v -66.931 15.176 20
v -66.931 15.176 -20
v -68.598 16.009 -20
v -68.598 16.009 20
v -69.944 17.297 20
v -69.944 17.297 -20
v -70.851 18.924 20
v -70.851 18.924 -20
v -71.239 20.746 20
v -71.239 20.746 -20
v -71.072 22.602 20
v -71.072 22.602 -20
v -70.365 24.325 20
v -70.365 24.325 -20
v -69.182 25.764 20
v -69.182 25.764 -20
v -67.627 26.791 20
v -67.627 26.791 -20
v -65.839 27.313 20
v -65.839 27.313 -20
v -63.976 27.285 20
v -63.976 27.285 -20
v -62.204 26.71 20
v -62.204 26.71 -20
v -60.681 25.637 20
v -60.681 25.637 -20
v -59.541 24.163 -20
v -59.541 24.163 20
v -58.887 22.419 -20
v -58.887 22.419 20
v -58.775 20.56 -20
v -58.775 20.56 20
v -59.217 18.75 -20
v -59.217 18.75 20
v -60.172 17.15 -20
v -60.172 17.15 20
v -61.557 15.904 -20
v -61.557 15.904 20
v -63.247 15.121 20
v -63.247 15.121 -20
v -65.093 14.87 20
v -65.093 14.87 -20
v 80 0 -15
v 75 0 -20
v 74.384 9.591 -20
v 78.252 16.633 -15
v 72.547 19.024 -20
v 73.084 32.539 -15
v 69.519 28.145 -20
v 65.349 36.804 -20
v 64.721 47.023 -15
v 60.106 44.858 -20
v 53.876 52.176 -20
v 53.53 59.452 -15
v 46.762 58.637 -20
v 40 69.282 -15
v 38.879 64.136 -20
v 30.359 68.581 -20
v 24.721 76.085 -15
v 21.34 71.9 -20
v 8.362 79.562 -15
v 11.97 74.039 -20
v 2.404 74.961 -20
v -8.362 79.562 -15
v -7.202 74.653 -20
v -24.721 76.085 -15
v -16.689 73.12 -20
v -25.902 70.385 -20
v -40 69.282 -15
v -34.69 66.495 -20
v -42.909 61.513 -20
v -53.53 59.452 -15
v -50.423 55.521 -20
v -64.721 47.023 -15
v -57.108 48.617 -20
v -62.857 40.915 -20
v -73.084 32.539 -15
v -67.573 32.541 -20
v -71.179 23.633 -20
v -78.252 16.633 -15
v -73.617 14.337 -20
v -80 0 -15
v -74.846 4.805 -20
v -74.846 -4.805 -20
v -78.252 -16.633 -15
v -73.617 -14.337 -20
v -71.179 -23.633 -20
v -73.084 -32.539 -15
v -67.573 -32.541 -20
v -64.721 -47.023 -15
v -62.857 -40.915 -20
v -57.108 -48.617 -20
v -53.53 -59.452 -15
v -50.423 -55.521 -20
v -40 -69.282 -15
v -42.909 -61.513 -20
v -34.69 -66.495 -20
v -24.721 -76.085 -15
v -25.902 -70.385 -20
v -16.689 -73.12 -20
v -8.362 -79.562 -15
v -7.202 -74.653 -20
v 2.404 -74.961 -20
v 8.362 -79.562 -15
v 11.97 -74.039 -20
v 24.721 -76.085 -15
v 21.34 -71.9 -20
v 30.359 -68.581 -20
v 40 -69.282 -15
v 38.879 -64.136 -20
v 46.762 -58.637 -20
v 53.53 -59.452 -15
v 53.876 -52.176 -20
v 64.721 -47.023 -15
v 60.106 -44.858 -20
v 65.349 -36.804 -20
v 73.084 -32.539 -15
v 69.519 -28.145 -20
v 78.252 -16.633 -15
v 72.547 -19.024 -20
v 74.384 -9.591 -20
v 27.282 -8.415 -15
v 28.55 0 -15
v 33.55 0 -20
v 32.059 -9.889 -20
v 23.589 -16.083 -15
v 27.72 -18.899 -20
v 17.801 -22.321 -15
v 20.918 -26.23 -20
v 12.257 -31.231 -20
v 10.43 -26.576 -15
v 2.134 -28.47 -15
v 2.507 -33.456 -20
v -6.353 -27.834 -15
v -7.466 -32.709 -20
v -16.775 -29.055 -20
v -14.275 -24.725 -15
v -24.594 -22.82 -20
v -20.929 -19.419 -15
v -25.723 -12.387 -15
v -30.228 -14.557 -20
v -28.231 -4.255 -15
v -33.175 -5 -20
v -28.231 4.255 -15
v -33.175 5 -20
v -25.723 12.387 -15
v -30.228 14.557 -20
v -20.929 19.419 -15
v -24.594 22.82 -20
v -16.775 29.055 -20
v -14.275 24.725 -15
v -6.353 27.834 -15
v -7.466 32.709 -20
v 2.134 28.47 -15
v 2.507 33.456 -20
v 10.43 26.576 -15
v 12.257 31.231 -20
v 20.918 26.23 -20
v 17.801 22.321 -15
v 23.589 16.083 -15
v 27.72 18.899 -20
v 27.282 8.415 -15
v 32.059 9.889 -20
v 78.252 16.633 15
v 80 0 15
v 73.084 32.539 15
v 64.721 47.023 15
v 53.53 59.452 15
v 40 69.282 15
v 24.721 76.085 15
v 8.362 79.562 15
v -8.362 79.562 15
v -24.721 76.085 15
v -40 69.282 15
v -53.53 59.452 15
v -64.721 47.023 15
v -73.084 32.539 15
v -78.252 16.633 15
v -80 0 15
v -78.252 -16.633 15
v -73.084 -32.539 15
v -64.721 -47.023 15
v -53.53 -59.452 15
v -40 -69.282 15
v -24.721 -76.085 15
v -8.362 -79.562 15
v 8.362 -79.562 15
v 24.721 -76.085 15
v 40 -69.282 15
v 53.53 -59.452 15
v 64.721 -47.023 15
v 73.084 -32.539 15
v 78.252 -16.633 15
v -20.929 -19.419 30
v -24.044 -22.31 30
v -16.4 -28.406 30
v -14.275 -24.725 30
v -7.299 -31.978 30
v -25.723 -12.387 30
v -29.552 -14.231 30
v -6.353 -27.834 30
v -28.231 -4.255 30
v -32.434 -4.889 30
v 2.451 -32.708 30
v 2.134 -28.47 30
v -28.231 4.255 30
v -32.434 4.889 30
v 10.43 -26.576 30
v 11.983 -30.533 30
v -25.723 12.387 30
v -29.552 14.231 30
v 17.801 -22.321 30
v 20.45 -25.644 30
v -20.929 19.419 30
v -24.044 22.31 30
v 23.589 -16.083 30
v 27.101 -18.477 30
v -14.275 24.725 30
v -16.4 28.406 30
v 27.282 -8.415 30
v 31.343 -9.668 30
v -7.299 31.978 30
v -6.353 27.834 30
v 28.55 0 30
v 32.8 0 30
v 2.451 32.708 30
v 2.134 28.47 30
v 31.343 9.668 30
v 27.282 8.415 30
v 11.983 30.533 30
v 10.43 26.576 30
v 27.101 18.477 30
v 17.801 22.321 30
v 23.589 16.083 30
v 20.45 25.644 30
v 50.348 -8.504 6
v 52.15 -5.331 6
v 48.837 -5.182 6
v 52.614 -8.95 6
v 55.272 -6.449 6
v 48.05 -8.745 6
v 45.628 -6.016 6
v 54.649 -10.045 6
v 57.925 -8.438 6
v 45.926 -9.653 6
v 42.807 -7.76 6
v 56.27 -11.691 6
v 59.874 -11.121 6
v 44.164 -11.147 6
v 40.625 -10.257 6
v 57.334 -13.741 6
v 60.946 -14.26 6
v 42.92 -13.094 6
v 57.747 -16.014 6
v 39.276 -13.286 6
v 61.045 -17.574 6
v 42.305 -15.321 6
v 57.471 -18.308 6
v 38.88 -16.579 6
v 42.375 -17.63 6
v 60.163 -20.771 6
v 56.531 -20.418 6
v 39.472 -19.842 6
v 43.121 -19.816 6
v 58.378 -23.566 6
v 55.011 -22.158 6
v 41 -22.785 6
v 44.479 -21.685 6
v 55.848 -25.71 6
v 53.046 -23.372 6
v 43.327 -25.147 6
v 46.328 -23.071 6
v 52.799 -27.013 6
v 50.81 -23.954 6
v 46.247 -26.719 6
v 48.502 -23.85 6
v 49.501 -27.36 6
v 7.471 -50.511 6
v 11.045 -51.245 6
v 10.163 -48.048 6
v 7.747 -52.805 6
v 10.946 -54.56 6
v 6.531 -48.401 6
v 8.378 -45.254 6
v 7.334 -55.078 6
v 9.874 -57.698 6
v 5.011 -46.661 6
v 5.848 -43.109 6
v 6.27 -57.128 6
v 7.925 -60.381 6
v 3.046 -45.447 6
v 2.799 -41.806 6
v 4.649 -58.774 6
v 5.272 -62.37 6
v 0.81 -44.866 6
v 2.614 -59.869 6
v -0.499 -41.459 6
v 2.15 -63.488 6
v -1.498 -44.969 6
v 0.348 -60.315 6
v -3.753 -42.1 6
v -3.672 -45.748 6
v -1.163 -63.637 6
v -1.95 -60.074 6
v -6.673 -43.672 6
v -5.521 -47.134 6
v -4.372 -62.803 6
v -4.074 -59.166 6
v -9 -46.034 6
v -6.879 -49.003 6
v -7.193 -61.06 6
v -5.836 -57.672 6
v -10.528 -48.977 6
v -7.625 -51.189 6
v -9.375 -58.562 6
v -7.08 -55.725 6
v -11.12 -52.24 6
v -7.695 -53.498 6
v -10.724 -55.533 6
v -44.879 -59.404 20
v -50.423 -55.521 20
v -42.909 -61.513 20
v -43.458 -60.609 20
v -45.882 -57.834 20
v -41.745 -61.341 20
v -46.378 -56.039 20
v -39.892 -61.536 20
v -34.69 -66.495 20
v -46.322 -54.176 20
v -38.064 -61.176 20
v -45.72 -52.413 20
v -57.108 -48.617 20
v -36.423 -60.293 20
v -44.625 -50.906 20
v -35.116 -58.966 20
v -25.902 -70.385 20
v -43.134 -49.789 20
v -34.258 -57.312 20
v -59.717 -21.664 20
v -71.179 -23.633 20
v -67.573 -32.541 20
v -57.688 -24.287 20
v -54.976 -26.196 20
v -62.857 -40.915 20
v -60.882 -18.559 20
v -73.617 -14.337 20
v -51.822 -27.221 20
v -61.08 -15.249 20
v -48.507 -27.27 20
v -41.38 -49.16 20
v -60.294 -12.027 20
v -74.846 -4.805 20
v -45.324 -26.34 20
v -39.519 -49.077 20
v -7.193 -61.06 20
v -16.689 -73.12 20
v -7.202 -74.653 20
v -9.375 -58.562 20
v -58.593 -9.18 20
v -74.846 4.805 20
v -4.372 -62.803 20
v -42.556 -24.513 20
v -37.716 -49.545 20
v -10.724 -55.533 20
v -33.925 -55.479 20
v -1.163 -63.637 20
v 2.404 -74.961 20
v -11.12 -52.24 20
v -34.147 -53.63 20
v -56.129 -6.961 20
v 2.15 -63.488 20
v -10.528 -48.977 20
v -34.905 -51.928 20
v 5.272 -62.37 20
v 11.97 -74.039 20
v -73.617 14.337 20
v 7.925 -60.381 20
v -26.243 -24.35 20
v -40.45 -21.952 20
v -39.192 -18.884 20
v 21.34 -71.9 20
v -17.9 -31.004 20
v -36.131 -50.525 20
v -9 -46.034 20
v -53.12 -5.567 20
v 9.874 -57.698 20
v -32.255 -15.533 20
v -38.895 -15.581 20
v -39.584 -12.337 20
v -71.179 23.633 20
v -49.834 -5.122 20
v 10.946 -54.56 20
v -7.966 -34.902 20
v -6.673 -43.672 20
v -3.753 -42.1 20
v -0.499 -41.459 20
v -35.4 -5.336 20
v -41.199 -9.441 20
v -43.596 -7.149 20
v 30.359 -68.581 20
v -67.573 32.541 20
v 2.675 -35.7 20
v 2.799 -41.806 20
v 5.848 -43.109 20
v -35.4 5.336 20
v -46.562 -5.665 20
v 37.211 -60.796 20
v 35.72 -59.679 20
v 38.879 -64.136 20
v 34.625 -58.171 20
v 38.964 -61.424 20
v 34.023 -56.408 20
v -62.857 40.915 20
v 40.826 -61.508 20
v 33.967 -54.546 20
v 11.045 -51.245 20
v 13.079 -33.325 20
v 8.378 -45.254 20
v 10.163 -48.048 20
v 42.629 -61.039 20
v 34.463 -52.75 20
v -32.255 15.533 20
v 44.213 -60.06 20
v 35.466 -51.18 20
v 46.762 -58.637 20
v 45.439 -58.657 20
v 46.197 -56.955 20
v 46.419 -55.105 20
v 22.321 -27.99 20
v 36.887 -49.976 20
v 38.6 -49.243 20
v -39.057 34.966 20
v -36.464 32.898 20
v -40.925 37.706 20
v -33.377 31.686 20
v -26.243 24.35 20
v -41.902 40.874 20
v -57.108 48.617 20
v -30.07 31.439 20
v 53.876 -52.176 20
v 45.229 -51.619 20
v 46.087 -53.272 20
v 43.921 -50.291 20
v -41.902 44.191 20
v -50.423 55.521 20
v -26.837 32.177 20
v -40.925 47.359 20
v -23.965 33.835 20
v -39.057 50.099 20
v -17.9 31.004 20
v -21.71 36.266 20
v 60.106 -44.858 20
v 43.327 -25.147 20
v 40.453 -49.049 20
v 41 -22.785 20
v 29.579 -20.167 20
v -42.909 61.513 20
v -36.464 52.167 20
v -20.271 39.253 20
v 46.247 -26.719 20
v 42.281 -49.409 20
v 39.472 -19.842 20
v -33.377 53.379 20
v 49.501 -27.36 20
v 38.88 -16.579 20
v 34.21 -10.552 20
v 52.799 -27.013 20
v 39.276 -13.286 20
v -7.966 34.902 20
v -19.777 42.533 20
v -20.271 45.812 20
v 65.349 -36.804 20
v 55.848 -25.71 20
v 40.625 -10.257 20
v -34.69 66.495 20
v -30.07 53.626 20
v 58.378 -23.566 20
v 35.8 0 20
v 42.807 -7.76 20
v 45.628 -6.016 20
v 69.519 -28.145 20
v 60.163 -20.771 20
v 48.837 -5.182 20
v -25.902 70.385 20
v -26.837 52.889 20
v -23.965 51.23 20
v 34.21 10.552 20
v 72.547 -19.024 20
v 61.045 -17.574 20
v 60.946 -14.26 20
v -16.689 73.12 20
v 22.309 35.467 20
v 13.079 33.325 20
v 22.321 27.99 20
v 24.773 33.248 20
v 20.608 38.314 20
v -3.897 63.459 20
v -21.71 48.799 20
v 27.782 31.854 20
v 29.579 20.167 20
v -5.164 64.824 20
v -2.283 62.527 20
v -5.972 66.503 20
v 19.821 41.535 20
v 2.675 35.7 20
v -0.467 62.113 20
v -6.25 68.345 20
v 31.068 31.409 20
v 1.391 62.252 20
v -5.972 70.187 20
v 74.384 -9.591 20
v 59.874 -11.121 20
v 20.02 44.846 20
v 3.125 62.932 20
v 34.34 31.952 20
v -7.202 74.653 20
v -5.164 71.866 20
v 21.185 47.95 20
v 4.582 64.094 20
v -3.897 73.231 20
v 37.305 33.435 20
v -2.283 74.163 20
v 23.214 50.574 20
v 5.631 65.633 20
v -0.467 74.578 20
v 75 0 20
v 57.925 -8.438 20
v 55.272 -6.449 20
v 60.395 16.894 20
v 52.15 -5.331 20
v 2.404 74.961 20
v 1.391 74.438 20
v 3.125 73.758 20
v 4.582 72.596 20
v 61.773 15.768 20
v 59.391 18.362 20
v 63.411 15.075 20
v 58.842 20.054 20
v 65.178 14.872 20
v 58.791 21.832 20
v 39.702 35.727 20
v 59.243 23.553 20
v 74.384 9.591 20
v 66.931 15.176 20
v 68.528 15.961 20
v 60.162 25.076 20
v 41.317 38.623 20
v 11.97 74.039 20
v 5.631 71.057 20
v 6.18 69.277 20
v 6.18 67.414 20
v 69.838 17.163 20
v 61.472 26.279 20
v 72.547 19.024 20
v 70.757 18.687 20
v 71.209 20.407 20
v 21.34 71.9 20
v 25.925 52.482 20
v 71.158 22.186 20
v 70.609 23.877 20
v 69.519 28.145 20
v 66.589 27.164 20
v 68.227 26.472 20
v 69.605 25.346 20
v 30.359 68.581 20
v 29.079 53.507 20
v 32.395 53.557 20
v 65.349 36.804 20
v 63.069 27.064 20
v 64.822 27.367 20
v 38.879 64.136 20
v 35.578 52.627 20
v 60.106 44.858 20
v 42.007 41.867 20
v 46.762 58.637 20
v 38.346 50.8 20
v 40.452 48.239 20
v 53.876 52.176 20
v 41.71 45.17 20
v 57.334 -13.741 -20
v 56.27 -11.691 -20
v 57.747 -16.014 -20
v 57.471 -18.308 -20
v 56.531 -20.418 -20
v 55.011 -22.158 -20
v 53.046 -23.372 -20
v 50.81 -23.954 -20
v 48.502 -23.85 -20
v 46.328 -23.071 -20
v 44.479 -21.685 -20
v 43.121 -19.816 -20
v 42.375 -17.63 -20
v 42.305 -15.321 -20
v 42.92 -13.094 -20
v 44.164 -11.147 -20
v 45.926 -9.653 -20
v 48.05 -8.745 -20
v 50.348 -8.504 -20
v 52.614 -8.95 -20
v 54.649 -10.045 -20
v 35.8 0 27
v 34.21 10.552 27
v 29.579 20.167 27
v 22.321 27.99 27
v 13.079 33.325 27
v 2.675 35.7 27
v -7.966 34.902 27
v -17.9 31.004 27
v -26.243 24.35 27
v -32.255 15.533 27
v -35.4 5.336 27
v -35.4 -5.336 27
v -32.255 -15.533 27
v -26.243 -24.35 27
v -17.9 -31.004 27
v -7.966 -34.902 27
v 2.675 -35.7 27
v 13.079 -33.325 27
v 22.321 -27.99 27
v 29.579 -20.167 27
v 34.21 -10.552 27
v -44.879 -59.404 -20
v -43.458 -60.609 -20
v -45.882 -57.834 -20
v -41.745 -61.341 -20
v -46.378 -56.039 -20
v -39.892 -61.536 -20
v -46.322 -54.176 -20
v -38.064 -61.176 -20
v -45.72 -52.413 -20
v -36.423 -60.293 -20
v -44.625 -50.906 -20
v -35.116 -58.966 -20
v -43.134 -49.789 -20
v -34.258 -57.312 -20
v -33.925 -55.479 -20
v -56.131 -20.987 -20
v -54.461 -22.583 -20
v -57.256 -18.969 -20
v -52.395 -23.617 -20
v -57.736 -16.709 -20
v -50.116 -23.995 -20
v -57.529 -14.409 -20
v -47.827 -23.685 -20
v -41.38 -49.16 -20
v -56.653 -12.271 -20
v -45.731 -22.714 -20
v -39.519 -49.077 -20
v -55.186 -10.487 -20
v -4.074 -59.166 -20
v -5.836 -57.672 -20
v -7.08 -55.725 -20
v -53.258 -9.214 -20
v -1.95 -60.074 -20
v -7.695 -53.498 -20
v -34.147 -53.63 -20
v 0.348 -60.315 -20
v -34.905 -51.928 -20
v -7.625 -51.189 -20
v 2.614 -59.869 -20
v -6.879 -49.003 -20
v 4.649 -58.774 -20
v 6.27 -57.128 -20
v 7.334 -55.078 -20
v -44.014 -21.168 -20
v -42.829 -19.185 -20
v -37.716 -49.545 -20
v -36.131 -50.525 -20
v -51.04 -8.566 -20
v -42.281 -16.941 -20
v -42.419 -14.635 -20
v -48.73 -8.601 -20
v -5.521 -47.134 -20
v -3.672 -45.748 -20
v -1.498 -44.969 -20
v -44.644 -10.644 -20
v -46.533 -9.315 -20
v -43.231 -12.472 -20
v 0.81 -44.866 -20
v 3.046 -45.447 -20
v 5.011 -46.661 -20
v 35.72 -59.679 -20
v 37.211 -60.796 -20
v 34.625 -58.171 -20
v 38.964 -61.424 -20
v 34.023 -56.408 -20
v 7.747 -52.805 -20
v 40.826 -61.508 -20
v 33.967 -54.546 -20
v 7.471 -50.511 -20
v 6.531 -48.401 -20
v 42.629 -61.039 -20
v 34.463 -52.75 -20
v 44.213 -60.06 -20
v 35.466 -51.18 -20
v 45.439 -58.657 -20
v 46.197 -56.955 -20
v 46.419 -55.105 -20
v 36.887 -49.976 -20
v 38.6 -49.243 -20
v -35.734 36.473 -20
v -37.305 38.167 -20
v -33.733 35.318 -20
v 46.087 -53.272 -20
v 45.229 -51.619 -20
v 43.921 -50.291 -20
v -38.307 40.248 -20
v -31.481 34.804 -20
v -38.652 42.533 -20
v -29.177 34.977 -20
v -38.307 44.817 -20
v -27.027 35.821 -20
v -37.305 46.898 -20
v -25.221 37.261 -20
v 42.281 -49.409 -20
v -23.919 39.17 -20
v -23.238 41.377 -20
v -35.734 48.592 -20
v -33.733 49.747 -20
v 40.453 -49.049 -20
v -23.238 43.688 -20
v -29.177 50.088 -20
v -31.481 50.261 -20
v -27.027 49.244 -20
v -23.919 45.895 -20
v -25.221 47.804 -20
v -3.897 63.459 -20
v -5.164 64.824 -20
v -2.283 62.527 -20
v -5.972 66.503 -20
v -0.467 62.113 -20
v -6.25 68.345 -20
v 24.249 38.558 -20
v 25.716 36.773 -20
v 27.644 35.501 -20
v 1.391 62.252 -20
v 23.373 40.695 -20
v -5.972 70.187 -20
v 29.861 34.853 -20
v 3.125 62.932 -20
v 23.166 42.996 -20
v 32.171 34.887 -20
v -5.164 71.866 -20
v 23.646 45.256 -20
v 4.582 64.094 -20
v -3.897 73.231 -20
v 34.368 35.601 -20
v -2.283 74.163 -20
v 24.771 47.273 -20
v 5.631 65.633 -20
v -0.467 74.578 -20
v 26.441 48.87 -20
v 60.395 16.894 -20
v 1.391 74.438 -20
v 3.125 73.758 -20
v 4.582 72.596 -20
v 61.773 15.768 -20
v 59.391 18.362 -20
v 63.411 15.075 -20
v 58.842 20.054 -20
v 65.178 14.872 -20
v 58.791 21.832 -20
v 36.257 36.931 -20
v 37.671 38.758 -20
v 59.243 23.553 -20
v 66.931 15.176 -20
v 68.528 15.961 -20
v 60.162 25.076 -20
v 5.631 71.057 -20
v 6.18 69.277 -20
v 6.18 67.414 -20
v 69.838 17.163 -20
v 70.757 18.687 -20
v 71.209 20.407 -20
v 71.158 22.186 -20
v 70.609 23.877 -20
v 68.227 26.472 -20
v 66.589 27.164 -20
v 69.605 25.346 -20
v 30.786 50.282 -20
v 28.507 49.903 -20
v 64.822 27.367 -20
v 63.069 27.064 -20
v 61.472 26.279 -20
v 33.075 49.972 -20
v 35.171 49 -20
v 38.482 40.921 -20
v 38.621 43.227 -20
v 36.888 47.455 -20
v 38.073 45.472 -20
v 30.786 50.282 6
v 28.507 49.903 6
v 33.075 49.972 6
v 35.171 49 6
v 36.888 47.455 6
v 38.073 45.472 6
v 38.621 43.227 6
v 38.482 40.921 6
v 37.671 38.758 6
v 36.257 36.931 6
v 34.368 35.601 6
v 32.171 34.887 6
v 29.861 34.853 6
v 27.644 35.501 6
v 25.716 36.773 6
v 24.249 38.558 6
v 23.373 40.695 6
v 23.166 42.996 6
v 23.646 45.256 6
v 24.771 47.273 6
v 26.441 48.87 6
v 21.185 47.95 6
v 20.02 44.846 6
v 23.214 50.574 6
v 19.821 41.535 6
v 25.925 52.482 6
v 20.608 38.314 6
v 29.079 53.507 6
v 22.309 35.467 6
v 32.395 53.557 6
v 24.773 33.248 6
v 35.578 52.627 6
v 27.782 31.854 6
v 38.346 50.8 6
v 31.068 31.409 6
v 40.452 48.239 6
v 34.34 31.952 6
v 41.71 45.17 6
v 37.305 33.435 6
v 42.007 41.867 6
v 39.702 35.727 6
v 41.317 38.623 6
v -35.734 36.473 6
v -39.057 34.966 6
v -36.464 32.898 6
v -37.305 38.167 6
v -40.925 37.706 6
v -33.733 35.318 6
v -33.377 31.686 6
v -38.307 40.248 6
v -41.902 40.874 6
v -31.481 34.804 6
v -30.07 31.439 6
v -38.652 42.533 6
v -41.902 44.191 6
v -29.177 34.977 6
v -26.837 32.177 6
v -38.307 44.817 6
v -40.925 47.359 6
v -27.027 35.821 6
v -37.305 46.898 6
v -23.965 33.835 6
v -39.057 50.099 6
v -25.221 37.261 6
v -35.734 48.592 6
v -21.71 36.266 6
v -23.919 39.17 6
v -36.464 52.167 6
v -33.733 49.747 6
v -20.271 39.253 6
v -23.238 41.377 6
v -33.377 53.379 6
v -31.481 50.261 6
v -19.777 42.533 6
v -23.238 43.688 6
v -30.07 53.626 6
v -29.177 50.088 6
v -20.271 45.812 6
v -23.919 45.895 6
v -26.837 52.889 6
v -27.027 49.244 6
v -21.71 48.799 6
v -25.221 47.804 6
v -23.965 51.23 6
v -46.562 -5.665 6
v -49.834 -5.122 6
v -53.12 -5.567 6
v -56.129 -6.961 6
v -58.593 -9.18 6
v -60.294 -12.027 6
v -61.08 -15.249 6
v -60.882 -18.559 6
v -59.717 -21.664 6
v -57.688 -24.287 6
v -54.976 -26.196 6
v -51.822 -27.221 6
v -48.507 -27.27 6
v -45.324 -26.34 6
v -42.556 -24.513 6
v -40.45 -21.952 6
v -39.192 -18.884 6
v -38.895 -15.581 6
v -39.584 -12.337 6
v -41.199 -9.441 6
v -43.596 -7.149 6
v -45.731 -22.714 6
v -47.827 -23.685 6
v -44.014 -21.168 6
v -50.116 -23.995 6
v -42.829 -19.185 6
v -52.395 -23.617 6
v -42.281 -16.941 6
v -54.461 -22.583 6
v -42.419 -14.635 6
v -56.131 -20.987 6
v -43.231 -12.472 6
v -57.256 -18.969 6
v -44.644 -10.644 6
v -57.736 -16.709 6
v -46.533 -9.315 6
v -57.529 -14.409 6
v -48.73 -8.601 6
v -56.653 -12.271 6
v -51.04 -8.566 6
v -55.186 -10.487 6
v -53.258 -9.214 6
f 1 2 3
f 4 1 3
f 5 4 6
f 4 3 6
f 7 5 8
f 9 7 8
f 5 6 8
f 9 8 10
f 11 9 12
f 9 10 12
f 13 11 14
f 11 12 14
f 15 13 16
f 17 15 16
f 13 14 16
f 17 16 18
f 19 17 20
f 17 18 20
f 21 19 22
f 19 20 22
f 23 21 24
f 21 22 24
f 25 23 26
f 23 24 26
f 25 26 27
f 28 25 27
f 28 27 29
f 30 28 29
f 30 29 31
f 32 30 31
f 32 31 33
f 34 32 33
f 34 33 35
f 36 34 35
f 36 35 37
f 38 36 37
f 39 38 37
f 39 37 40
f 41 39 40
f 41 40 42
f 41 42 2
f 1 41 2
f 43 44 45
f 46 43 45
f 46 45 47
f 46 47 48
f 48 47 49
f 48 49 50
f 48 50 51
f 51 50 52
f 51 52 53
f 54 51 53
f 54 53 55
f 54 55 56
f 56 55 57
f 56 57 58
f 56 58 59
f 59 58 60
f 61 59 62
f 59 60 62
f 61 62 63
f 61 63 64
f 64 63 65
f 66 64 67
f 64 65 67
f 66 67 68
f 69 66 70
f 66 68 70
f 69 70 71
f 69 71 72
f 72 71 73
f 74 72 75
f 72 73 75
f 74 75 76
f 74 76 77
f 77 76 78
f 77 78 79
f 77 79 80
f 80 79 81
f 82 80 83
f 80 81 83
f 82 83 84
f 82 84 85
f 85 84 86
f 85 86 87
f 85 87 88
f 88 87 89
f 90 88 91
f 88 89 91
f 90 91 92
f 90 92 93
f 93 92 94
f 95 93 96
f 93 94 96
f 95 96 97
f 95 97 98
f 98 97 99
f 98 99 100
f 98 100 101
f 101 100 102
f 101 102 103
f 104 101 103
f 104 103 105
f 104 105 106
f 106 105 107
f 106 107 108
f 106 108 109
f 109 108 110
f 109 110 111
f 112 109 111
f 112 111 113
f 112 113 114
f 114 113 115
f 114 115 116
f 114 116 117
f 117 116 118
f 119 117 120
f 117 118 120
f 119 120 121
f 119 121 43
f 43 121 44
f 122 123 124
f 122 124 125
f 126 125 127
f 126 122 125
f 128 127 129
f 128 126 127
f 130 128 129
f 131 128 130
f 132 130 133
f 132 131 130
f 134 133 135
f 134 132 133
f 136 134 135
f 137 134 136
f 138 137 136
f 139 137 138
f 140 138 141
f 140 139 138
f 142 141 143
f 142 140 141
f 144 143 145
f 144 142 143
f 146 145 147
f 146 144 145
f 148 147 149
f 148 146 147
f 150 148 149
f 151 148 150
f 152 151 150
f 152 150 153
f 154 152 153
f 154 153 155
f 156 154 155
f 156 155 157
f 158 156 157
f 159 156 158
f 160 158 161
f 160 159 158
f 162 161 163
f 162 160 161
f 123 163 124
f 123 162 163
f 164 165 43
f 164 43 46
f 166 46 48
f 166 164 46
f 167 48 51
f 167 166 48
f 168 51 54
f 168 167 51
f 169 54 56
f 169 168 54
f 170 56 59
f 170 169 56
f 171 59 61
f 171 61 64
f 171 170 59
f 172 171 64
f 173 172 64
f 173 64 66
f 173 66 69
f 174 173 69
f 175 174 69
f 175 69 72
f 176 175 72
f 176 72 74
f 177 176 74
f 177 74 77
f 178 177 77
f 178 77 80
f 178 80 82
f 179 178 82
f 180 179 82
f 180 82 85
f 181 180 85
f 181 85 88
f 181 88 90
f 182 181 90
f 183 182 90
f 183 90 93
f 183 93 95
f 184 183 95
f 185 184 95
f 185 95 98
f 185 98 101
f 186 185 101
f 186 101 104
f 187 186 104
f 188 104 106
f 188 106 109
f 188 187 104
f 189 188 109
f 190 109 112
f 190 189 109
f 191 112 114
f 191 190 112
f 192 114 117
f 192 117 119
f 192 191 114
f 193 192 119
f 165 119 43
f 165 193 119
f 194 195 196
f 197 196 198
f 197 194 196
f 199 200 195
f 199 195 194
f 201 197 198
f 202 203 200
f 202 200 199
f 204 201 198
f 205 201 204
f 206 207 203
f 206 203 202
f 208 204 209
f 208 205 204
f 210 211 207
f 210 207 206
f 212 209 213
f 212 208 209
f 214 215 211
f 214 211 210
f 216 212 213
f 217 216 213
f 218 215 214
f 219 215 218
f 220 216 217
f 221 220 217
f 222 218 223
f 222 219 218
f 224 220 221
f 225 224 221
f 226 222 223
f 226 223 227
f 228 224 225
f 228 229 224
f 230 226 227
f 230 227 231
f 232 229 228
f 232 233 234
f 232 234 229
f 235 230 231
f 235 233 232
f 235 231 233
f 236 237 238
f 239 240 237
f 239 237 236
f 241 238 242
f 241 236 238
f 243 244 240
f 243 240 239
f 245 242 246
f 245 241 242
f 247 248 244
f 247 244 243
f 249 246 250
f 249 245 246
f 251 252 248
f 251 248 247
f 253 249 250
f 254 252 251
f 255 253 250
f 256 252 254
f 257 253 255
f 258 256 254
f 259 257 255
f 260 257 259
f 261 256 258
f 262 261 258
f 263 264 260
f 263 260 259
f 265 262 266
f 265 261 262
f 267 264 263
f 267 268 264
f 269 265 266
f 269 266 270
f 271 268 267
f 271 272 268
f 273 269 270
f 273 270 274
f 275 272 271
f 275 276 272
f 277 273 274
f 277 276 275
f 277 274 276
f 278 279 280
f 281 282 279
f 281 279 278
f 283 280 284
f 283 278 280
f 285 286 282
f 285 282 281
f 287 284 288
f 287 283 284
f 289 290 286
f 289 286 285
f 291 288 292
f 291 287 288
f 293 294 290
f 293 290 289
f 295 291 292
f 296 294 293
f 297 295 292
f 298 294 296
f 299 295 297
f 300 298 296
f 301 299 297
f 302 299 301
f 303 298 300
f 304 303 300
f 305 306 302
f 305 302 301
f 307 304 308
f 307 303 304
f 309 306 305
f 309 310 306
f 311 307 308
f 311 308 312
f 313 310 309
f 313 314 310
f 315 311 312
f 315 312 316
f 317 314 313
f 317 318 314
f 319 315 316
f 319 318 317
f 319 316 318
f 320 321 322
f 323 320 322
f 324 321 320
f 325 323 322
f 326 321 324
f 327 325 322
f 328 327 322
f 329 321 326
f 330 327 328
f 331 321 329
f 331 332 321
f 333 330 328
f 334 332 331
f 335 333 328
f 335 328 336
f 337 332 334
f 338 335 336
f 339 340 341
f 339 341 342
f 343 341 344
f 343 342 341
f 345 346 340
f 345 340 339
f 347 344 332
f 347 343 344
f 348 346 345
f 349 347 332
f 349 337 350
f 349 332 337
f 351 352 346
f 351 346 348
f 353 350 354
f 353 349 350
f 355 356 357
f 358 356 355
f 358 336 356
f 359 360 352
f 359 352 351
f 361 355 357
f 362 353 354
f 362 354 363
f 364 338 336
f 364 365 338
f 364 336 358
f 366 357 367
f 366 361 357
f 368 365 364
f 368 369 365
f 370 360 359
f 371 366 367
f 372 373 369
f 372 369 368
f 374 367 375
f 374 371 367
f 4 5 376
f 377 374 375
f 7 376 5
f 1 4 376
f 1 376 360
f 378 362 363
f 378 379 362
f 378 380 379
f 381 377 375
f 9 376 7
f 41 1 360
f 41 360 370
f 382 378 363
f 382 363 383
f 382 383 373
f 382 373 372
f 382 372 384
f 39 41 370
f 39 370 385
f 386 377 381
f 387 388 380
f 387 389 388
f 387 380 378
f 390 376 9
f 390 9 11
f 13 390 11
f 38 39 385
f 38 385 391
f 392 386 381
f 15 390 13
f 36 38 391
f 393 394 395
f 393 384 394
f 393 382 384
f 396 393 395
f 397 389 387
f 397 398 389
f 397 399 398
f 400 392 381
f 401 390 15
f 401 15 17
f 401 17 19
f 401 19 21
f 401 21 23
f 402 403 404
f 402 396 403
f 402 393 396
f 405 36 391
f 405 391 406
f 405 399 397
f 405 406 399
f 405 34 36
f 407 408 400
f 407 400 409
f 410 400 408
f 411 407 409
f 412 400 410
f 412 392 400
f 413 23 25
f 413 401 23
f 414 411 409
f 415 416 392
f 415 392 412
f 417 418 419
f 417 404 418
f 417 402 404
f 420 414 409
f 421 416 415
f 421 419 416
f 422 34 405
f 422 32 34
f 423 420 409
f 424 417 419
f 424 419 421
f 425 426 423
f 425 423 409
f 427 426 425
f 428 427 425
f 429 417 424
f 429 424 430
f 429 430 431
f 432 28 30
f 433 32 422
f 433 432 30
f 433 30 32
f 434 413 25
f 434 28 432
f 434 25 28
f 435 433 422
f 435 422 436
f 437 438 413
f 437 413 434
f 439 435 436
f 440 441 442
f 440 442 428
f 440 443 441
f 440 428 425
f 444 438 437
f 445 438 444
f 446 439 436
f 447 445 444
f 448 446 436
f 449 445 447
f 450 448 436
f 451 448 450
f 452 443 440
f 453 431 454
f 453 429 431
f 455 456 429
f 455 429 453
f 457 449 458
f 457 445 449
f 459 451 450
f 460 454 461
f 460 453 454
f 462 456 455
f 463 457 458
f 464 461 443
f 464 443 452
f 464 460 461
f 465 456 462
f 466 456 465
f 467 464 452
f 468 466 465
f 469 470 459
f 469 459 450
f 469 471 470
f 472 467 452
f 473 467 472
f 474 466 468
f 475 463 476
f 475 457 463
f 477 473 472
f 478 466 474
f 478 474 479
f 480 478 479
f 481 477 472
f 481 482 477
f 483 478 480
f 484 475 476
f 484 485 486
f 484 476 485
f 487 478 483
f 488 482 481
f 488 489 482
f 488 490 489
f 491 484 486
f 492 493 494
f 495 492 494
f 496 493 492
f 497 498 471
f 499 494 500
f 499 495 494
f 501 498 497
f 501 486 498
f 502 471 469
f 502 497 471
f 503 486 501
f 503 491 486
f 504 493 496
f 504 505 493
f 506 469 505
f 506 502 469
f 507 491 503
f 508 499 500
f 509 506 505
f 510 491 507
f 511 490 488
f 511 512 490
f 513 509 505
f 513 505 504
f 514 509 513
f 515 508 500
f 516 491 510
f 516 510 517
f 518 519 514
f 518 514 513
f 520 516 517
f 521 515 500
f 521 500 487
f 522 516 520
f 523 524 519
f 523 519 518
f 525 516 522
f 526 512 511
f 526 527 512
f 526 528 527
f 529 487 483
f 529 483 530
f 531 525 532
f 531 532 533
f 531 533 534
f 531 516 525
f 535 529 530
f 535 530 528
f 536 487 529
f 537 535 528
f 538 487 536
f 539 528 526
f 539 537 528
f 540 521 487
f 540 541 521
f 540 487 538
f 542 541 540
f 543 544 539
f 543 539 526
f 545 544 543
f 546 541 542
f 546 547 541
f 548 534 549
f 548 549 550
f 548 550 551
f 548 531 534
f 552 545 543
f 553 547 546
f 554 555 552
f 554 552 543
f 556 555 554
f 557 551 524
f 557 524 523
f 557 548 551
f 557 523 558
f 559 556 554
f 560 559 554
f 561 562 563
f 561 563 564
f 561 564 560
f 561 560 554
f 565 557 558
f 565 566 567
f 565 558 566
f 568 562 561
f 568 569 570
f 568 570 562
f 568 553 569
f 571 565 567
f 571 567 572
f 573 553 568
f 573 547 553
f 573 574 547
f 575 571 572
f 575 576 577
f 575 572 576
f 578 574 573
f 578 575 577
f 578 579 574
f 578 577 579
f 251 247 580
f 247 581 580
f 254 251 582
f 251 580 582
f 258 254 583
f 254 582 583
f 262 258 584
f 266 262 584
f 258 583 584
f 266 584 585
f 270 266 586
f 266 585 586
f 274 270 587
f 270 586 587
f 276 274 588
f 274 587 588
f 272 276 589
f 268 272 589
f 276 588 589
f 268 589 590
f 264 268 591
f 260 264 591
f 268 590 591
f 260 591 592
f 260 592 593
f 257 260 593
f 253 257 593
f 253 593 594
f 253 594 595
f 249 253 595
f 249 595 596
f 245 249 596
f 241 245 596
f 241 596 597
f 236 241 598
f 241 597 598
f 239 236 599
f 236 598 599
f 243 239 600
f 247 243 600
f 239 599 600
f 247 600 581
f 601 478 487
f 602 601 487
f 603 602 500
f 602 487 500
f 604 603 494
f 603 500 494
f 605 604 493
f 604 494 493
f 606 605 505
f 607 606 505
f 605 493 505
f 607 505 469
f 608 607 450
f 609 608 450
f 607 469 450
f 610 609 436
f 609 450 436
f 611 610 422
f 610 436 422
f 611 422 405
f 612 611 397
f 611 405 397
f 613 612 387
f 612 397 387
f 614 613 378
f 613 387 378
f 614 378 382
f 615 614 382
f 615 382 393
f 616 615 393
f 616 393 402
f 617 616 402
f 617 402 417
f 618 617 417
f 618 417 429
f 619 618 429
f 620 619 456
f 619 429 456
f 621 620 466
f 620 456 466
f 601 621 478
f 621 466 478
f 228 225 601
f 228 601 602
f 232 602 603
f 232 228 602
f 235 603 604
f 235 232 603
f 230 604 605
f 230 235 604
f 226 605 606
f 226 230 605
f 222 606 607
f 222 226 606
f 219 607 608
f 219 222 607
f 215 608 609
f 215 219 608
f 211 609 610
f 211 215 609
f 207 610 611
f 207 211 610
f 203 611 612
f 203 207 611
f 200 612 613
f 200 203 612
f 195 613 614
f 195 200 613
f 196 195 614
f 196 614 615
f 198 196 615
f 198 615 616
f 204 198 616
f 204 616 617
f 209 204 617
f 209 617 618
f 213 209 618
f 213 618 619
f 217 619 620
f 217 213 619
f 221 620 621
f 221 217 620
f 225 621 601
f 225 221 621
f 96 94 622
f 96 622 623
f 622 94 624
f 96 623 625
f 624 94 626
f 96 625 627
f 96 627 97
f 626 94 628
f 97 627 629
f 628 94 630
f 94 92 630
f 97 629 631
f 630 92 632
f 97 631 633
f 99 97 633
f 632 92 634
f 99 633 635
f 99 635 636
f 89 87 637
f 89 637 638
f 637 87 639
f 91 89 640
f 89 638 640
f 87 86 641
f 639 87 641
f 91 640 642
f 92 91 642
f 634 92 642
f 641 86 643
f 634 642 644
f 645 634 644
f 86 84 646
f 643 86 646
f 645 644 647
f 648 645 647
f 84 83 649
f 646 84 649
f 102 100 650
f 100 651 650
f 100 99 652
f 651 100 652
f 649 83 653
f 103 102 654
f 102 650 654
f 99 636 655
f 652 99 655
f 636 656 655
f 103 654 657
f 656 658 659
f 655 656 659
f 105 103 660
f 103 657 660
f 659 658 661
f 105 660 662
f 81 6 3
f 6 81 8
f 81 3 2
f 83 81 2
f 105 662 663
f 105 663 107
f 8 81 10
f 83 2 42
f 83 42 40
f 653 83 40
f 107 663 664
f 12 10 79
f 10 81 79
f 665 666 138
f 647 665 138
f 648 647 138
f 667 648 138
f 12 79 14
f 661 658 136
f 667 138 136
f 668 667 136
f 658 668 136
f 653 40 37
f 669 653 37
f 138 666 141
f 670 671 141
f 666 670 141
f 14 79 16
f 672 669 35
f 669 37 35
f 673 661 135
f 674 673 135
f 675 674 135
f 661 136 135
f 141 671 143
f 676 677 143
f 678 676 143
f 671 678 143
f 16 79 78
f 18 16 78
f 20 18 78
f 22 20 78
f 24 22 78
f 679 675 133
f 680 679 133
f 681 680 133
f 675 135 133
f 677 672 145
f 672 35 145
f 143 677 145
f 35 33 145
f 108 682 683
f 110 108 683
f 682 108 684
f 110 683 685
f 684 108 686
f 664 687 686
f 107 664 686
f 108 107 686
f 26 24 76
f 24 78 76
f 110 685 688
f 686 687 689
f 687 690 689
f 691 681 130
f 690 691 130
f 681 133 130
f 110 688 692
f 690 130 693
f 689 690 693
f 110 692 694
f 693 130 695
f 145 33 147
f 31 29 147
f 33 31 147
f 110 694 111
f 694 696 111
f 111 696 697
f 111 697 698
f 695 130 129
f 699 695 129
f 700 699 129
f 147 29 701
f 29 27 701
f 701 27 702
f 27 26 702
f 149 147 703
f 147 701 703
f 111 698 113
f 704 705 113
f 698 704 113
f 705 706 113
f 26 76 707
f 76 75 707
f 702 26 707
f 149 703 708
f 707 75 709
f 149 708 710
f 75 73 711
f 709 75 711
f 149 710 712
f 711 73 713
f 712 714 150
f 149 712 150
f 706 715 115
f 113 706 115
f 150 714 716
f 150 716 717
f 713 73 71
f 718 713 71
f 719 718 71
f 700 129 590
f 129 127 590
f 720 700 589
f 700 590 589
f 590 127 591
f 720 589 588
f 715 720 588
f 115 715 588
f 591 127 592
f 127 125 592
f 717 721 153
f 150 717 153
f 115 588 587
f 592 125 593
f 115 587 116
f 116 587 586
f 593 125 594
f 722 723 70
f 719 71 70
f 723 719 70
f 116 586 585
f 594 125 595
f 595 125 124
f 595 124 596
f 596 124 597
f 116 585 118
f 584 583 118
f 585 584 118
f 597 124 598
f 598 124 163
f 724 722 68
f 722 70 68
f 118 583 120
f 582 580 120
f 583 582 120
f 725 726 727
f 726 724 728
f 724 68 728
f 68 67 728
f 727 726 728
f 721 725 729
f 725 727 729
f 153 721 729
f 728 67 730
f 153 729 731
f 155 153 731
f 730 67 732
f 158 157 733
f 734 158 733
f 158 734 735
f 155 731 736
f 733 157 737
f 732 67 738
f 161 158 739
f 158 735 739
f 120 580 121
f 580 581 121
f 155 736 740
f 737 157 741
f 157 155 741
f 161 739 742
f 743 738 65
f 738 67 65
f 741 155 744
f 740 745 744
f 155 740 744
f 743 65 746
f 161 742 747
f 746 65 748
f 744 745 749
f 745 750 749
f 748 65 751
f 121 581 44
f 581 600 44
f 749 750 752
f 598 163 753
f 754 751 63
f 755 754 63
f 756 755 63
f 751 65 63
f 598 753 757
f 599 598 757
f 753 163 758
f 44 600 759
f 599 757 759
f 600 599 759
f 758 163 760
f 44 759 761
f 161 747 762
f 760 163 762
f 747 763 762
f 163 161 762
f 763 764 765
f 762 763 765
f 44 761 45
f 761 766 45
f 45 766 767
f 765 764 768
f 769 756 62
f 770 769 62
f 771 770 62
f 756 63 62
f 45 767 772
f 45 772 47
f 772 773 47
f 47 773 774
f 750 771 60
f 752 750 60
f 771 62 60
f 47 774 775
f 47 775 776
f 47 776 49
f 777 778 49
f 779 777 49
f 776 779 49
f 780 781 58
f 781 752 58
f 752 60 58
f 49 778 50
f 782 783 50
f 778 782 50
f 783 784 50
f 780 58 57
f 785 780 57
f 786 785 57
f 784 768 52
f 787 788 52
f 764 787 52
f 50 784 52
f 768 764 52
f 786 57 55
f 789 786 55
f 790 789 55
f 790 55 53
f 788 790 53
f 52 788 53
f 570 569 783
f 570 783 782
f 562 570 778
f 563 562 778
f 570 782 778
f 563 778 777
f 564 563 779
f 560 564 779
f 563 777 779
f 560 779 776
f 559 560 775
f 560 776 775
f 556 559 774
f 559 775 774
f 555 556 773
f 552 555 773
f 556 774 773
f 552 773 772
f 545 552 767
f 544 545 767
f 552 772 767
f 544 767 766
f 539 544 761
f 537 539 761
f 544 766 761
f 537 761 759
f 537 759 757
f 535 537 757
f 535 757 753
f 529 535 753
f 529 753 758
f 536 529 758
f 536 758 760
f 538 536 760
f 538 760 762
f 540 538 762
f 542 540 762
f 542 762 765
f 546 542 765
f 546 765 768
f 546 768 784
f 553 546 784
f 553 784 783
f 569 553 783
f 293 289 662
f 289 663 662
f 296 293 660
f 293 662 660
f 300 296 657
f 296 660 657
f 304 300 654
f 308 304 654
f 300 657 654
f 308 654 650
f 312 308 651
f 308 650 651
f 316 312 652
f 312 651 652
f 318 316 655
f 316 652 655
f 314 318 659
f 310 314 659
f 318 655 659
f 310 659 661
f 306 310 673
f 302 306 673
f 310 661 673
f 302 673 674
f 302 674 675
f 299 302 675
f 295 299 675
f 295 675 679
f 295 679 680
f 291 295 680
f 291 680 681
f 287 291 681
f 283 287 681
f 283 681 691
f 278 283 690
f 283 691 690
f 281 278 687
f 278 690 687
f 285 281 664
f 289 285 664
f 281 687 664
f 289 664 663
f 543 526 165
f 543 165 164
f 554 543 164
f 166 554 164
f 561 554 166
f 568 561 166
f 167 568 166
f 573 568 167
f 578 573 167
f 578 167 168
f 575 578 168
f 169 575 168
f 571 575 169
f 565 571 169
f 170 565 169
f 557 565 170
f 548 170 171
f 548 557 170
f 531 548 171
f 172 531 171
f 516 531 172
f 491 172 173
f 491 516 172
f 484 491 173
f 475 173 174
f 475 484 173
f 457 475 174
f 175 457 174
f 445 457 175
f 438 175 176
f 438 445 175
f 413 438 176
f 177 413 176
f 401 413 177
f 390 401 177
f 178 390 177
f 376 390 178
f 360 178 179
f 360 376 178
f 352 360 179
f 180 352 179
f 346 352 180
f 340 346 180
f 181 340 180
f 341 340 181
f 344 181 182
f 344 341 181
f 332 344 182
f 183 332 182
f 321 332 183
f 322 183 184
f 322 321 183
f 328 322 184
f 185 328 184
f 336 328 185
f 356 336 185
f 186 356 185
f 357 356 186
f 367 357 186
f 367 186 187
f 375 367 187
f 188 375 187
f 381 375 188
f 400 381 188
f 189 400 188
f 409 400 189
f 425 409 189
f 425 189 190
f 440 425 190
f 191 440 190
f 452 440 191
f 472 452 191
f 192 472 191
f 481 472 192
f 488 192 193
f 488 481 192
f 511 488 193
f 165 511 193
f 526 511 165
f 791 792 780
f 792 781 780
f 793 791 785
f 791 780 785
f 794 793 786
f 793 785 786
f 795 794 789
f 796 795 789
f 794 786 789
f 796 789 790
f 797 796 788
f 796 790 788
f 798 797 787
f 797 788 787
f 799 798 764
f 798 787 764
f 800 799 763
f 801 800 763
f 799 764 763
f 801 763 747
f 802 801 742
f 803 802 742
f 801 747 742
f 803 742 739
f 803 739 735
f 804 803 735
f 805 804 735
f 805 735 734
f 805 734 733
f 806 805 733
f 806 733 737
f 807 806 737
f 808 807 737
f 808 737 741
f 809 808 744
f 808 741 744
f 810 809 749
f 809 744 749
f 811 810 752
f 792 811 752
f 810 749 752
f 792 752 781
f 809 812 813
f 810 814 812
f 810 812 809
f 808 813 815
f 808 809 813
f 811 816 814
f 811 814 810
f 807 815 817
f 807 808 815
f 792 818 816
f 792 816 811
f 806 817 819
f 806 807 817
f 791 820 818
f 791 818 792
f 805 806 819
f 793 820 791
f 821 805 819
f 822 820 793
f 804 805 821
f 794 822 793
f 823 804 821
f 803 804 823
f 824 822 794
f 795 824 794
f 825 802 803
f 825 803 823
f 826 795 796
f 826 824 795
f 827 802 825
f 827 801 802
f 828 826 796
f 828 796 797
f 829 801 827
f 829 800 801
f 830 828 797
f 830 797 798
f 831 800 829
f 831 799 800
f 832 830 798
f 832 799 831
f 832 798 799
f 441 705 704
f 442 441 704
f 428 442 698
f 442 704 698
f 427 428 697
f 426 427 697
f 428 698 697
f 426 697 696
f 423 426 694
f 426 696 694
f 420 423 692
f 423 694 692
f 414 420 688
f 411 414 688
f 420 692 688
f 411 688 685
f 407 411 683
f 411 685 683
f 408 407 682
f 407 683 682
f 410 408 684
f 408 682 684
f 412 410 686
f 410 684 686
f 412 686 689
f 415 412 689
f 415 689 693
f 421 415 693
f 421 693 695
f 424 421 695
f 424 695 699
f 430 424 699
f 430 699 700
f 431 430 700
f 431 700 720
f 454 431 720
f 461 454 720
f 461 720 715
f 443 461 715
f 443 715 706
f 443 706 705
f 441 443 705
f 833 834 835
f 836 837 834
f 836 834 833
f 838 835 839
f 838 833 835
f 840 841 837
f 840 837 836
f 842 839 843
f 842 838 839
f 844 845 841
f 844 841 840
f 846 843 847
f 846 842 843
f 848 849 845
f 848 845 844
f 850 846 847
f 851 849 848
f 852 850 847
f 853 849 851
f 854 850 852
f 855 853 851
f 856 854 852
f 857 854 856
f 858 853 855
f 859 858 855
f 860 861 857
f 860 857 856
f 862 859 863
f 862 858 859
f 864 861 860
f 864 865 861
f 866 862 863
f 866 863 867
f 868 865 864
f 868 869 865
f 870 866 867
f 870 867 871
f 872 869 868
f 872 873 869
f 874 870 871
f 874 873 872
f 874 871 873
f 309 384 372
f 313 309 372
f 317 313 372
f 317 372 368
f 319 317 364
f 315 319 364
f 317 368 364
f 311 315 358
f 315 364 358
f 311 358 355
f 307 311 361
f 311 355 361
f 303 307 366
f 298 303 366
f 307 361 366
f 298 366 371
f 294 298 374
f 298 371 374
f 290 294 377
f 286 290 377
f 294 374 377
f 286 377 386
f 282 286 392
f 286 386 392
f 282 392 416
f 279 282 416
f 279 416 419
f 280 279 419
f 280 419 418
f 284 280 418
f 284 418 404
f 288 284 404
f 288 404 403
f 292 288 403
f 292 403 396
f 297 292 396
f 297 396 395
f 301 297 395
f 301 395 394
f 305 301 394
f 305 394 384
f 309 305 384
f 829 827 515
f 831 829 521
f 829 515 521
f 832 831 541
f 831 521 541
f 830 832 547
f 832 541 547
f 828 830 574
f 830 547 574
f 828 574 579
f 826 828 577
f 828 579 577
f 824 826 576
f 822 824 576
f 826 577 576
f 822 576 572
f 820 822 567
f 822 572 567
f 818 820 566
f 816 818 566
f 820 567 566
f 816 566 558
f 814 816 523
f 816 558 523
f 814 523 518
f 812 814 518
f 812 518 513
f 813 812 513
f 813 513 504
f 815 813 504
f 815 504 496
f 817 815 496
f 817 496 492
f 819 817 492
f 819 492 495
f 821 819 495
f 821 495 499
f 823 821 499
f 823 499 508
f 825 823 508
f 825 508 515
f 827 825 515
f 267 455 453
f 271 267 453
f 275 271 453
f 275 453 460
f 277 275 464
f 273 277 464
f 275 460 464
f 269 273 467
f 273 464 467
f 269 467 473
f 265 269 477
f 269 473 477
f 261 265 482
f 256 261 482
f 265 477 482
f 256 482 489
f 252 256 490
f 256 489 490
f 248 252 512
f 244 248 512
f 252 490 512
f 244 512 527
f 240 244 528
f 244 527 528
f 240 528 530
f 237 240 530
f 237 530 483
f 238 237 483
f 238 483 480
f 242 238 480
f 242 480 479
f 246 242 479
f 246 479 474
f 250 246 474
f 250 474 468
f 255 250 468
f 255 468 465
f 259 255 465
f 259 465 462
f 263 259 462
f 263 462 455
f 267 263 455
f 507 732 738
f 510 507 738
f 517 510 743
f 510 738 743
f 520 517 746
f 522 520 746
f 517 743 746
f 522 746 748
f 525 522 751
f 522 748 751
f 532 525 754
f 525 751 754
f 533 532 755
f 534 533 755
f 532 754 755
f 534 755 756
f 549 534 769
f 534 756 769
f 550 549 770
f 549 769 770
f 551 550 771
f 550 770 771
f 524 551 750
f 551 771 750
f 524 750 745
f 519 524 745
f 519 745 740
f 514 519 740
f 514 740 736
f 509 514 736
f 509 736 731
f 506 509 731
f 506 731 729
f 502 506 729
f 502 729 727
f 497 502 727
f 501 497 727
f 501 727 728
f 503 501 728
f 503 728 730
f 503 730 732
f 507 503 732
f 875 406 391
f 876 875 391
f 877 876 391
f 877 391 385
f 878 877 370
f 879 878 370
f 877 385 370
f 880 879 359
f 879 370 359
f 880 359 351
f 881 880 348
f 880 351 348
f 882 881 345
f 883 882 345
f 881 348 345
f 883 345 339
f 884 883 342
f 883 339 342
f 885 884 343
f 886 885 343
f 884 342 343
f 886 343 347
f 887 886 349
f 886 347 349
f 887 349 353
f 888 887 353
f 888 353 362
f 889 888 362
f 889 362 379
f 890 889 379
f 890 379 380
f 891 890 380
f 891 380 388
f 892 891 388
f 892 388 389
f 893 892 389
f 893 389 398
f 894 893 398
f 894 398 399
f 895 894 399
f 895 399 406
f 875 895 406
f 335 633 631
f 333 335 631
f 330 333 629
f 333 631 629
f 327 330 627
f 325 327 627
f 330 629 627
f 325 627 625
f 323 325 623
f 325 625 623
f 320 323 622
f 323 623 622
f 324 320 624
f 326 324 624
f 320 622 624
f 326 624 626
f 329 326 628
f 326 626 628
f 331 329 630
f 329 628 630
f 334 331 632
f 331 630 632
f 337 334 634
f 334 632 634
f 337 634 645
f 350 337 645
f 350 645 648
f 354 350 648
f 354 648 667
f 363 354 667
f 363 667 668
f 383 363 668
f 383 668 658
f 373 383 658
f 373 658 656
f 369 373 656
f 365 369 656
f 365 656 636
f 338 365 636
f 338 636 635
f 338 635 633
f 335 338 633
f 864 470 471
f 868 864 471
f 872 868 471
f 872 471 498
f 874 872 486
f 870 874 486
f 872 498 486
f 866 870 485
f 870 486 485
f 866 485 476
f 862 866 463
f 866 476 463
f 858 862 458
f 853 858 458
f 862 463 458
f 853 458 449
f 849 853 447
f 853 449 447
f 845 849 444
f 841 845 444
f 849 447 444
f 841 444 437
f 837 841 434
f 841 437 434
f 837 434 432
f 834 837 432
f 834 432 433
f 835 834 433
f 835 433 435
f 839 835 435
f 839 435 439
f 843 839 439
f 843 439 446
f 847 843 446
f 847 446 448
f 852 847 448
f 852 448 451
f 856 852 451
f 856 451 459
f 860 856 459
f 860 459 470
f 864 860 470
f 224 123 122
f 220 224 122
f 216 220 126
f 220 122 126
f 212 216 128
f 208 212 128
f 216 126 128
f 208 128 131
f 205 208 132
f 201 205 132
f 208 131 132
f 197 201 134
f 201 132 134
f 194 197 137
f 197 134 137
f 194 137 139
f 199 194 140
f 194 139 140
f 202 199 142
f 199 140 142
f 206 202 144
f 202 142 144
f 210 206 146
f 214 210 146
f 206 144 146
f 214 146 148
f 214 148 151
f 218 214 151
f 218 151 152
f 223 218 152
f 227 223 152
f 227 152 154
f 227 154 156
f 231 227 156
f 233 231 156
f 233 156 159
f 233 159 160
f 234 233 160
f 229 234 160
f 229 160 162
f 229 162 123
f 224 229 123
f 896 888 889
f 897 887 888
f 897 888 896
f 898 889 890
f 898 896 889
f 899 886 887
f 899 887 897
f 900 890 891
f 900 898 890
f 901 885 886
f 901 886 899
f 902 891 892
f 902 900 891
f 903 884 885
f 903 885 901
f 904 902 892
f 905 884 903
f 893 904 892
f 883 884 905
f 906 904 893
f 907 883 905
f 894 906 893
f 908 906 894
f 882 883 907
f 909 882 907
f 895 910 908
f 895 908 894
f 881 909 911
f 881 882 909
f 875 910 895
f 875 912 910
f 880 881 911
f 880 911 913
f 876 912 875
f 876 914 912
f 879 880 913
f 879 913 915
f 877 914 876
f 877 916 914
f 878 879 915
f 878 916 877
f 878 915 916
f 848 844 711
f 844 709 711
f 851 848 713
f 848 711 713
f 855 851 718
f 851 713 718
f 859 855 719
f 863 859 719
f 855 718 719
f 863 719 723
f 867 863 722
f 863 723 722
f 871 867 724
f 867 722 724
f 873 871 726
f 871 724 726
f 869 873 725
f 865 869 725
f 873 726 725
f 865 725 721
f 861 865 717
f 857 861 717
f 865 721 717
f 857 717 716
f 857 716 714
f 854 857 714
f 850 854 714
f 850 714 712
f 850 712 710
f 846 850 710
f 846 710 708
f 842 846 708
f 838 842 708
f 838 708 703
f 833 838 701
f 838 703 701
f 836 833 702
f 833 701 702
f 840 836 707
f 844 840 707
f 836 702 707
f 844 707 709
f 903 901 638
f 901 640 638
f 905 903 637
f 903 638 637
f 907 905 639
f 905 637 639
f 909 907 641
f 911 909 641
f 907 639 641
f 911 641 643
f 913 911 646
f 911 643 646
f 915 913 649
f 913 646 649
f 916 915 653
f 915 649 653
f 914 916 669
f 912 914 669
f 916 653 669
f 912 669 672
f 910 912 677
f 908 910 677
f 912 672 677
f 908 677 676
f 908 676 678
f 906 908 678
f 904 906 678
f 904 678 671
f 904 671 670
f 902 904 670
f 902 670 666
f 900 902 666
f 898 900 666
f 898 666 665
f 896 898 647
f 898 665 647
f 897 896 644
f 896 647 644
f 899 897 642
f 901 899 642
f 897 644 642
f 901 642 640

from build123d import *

# Parameters (mm, degrees)
F0_R             = 80
F1_DEPTH         = 20
F2_R             = 35.8
F3_DEPTH         = 10
F6_R             = 28.55
F7_DEPTH         = 50.001
F9_D             = 15.5
F9_CBORE_D       = 22.25
F9_CBORE_DEPTH   = 14
F9_COPIES_COUNT  = 5
F10_D            = 12.5
F10_COPIES_COUNT = 5
F11_SIZE         = 5
F12_SIZE         = 3


# Not quite as in the source:
# - a pattern or mirror of a feature is missing from the dataset's text; its kind, count and spacing are read off the source's solid
# - the program builds the solid bodies; features that only make, move or delete a surface that nothing else refers to are left out


with BuildPart() as f1:
    # F0 (on Top) → F1 (new body, symmetric)
    with BuildSketch(Plane.XY):
        Circle(F0_R)
    extrude(amount=F1_DEPTH, both=True)

    # F2 (on face) → F3 (join)
    with BuildSketch(Plane.XY.offset(20)):
        Circle(F2_R)
    extrude(amount=F3_DEPTH)

    # F6 (on face) → F7 (cut, through all)
    with BuildSketch(Plane(origin=(0, 0, -20), x_dir=(1, 0, 0), z_dir=(0, 0, -1))):
        Circle(F6_R)
    extrude(amount=-F7_DEPTH, mode=Mode.SUBTRACT)

    # F9 (through all)
    with Locations(Plane.XY.offset(20)):
        with Locations((-30.9016994375, 42.5325404176)):
            f9 = CounterBoreHole(F9_D / 2, F9_CBORE_D / 2, F9_CBORE_DEPTH)

    # F9_copies: F9 ×5 about axis
    f9_copies_axis = Axis((0, 0, 0), (0, 0, 1))
    for i in range(1, F9_COPIES_COUNT):
        add(f9.rotate(f9_copies_axis, i * 360 / F9_COPIES_COUNT), mode=Mode.SUBTRACT)

    # F10 (through all)
    with Locations(Plane.XY.offset(20)):
        with Locations((0, 68.3450445755)):
            f10 = Hole(F10_D / 2)

    # F10_copies: F10 ×5 about axis
    f10_copies_axis = Axis((0, 0, 0), (0, 0, 1))
    for i in range(1, F10_COPIES_COUNT):
        add(f10.rotate(f10_copies_axis, i * 360 / F10_COPIES_COUNT), mode=Mode.SUBTRACT)

    # F11
    f11_edges = [f1.edges().sort_by_distance(p)[0] for p in [
        (-80, 0, 20),
        (-28.55, 0, -20),
        (-80, 0, -20),
    ]]
    chamfer(f11_edges, length=F11_SIZE)

    # F12
    f12_edges = [f1.edges().sort_by_distance(p)[0] for p in [
        (-35.8, 0, 30),
    ]]
    chamfer(f12_edges, length=F12_SIZE)


solid = f1.part
